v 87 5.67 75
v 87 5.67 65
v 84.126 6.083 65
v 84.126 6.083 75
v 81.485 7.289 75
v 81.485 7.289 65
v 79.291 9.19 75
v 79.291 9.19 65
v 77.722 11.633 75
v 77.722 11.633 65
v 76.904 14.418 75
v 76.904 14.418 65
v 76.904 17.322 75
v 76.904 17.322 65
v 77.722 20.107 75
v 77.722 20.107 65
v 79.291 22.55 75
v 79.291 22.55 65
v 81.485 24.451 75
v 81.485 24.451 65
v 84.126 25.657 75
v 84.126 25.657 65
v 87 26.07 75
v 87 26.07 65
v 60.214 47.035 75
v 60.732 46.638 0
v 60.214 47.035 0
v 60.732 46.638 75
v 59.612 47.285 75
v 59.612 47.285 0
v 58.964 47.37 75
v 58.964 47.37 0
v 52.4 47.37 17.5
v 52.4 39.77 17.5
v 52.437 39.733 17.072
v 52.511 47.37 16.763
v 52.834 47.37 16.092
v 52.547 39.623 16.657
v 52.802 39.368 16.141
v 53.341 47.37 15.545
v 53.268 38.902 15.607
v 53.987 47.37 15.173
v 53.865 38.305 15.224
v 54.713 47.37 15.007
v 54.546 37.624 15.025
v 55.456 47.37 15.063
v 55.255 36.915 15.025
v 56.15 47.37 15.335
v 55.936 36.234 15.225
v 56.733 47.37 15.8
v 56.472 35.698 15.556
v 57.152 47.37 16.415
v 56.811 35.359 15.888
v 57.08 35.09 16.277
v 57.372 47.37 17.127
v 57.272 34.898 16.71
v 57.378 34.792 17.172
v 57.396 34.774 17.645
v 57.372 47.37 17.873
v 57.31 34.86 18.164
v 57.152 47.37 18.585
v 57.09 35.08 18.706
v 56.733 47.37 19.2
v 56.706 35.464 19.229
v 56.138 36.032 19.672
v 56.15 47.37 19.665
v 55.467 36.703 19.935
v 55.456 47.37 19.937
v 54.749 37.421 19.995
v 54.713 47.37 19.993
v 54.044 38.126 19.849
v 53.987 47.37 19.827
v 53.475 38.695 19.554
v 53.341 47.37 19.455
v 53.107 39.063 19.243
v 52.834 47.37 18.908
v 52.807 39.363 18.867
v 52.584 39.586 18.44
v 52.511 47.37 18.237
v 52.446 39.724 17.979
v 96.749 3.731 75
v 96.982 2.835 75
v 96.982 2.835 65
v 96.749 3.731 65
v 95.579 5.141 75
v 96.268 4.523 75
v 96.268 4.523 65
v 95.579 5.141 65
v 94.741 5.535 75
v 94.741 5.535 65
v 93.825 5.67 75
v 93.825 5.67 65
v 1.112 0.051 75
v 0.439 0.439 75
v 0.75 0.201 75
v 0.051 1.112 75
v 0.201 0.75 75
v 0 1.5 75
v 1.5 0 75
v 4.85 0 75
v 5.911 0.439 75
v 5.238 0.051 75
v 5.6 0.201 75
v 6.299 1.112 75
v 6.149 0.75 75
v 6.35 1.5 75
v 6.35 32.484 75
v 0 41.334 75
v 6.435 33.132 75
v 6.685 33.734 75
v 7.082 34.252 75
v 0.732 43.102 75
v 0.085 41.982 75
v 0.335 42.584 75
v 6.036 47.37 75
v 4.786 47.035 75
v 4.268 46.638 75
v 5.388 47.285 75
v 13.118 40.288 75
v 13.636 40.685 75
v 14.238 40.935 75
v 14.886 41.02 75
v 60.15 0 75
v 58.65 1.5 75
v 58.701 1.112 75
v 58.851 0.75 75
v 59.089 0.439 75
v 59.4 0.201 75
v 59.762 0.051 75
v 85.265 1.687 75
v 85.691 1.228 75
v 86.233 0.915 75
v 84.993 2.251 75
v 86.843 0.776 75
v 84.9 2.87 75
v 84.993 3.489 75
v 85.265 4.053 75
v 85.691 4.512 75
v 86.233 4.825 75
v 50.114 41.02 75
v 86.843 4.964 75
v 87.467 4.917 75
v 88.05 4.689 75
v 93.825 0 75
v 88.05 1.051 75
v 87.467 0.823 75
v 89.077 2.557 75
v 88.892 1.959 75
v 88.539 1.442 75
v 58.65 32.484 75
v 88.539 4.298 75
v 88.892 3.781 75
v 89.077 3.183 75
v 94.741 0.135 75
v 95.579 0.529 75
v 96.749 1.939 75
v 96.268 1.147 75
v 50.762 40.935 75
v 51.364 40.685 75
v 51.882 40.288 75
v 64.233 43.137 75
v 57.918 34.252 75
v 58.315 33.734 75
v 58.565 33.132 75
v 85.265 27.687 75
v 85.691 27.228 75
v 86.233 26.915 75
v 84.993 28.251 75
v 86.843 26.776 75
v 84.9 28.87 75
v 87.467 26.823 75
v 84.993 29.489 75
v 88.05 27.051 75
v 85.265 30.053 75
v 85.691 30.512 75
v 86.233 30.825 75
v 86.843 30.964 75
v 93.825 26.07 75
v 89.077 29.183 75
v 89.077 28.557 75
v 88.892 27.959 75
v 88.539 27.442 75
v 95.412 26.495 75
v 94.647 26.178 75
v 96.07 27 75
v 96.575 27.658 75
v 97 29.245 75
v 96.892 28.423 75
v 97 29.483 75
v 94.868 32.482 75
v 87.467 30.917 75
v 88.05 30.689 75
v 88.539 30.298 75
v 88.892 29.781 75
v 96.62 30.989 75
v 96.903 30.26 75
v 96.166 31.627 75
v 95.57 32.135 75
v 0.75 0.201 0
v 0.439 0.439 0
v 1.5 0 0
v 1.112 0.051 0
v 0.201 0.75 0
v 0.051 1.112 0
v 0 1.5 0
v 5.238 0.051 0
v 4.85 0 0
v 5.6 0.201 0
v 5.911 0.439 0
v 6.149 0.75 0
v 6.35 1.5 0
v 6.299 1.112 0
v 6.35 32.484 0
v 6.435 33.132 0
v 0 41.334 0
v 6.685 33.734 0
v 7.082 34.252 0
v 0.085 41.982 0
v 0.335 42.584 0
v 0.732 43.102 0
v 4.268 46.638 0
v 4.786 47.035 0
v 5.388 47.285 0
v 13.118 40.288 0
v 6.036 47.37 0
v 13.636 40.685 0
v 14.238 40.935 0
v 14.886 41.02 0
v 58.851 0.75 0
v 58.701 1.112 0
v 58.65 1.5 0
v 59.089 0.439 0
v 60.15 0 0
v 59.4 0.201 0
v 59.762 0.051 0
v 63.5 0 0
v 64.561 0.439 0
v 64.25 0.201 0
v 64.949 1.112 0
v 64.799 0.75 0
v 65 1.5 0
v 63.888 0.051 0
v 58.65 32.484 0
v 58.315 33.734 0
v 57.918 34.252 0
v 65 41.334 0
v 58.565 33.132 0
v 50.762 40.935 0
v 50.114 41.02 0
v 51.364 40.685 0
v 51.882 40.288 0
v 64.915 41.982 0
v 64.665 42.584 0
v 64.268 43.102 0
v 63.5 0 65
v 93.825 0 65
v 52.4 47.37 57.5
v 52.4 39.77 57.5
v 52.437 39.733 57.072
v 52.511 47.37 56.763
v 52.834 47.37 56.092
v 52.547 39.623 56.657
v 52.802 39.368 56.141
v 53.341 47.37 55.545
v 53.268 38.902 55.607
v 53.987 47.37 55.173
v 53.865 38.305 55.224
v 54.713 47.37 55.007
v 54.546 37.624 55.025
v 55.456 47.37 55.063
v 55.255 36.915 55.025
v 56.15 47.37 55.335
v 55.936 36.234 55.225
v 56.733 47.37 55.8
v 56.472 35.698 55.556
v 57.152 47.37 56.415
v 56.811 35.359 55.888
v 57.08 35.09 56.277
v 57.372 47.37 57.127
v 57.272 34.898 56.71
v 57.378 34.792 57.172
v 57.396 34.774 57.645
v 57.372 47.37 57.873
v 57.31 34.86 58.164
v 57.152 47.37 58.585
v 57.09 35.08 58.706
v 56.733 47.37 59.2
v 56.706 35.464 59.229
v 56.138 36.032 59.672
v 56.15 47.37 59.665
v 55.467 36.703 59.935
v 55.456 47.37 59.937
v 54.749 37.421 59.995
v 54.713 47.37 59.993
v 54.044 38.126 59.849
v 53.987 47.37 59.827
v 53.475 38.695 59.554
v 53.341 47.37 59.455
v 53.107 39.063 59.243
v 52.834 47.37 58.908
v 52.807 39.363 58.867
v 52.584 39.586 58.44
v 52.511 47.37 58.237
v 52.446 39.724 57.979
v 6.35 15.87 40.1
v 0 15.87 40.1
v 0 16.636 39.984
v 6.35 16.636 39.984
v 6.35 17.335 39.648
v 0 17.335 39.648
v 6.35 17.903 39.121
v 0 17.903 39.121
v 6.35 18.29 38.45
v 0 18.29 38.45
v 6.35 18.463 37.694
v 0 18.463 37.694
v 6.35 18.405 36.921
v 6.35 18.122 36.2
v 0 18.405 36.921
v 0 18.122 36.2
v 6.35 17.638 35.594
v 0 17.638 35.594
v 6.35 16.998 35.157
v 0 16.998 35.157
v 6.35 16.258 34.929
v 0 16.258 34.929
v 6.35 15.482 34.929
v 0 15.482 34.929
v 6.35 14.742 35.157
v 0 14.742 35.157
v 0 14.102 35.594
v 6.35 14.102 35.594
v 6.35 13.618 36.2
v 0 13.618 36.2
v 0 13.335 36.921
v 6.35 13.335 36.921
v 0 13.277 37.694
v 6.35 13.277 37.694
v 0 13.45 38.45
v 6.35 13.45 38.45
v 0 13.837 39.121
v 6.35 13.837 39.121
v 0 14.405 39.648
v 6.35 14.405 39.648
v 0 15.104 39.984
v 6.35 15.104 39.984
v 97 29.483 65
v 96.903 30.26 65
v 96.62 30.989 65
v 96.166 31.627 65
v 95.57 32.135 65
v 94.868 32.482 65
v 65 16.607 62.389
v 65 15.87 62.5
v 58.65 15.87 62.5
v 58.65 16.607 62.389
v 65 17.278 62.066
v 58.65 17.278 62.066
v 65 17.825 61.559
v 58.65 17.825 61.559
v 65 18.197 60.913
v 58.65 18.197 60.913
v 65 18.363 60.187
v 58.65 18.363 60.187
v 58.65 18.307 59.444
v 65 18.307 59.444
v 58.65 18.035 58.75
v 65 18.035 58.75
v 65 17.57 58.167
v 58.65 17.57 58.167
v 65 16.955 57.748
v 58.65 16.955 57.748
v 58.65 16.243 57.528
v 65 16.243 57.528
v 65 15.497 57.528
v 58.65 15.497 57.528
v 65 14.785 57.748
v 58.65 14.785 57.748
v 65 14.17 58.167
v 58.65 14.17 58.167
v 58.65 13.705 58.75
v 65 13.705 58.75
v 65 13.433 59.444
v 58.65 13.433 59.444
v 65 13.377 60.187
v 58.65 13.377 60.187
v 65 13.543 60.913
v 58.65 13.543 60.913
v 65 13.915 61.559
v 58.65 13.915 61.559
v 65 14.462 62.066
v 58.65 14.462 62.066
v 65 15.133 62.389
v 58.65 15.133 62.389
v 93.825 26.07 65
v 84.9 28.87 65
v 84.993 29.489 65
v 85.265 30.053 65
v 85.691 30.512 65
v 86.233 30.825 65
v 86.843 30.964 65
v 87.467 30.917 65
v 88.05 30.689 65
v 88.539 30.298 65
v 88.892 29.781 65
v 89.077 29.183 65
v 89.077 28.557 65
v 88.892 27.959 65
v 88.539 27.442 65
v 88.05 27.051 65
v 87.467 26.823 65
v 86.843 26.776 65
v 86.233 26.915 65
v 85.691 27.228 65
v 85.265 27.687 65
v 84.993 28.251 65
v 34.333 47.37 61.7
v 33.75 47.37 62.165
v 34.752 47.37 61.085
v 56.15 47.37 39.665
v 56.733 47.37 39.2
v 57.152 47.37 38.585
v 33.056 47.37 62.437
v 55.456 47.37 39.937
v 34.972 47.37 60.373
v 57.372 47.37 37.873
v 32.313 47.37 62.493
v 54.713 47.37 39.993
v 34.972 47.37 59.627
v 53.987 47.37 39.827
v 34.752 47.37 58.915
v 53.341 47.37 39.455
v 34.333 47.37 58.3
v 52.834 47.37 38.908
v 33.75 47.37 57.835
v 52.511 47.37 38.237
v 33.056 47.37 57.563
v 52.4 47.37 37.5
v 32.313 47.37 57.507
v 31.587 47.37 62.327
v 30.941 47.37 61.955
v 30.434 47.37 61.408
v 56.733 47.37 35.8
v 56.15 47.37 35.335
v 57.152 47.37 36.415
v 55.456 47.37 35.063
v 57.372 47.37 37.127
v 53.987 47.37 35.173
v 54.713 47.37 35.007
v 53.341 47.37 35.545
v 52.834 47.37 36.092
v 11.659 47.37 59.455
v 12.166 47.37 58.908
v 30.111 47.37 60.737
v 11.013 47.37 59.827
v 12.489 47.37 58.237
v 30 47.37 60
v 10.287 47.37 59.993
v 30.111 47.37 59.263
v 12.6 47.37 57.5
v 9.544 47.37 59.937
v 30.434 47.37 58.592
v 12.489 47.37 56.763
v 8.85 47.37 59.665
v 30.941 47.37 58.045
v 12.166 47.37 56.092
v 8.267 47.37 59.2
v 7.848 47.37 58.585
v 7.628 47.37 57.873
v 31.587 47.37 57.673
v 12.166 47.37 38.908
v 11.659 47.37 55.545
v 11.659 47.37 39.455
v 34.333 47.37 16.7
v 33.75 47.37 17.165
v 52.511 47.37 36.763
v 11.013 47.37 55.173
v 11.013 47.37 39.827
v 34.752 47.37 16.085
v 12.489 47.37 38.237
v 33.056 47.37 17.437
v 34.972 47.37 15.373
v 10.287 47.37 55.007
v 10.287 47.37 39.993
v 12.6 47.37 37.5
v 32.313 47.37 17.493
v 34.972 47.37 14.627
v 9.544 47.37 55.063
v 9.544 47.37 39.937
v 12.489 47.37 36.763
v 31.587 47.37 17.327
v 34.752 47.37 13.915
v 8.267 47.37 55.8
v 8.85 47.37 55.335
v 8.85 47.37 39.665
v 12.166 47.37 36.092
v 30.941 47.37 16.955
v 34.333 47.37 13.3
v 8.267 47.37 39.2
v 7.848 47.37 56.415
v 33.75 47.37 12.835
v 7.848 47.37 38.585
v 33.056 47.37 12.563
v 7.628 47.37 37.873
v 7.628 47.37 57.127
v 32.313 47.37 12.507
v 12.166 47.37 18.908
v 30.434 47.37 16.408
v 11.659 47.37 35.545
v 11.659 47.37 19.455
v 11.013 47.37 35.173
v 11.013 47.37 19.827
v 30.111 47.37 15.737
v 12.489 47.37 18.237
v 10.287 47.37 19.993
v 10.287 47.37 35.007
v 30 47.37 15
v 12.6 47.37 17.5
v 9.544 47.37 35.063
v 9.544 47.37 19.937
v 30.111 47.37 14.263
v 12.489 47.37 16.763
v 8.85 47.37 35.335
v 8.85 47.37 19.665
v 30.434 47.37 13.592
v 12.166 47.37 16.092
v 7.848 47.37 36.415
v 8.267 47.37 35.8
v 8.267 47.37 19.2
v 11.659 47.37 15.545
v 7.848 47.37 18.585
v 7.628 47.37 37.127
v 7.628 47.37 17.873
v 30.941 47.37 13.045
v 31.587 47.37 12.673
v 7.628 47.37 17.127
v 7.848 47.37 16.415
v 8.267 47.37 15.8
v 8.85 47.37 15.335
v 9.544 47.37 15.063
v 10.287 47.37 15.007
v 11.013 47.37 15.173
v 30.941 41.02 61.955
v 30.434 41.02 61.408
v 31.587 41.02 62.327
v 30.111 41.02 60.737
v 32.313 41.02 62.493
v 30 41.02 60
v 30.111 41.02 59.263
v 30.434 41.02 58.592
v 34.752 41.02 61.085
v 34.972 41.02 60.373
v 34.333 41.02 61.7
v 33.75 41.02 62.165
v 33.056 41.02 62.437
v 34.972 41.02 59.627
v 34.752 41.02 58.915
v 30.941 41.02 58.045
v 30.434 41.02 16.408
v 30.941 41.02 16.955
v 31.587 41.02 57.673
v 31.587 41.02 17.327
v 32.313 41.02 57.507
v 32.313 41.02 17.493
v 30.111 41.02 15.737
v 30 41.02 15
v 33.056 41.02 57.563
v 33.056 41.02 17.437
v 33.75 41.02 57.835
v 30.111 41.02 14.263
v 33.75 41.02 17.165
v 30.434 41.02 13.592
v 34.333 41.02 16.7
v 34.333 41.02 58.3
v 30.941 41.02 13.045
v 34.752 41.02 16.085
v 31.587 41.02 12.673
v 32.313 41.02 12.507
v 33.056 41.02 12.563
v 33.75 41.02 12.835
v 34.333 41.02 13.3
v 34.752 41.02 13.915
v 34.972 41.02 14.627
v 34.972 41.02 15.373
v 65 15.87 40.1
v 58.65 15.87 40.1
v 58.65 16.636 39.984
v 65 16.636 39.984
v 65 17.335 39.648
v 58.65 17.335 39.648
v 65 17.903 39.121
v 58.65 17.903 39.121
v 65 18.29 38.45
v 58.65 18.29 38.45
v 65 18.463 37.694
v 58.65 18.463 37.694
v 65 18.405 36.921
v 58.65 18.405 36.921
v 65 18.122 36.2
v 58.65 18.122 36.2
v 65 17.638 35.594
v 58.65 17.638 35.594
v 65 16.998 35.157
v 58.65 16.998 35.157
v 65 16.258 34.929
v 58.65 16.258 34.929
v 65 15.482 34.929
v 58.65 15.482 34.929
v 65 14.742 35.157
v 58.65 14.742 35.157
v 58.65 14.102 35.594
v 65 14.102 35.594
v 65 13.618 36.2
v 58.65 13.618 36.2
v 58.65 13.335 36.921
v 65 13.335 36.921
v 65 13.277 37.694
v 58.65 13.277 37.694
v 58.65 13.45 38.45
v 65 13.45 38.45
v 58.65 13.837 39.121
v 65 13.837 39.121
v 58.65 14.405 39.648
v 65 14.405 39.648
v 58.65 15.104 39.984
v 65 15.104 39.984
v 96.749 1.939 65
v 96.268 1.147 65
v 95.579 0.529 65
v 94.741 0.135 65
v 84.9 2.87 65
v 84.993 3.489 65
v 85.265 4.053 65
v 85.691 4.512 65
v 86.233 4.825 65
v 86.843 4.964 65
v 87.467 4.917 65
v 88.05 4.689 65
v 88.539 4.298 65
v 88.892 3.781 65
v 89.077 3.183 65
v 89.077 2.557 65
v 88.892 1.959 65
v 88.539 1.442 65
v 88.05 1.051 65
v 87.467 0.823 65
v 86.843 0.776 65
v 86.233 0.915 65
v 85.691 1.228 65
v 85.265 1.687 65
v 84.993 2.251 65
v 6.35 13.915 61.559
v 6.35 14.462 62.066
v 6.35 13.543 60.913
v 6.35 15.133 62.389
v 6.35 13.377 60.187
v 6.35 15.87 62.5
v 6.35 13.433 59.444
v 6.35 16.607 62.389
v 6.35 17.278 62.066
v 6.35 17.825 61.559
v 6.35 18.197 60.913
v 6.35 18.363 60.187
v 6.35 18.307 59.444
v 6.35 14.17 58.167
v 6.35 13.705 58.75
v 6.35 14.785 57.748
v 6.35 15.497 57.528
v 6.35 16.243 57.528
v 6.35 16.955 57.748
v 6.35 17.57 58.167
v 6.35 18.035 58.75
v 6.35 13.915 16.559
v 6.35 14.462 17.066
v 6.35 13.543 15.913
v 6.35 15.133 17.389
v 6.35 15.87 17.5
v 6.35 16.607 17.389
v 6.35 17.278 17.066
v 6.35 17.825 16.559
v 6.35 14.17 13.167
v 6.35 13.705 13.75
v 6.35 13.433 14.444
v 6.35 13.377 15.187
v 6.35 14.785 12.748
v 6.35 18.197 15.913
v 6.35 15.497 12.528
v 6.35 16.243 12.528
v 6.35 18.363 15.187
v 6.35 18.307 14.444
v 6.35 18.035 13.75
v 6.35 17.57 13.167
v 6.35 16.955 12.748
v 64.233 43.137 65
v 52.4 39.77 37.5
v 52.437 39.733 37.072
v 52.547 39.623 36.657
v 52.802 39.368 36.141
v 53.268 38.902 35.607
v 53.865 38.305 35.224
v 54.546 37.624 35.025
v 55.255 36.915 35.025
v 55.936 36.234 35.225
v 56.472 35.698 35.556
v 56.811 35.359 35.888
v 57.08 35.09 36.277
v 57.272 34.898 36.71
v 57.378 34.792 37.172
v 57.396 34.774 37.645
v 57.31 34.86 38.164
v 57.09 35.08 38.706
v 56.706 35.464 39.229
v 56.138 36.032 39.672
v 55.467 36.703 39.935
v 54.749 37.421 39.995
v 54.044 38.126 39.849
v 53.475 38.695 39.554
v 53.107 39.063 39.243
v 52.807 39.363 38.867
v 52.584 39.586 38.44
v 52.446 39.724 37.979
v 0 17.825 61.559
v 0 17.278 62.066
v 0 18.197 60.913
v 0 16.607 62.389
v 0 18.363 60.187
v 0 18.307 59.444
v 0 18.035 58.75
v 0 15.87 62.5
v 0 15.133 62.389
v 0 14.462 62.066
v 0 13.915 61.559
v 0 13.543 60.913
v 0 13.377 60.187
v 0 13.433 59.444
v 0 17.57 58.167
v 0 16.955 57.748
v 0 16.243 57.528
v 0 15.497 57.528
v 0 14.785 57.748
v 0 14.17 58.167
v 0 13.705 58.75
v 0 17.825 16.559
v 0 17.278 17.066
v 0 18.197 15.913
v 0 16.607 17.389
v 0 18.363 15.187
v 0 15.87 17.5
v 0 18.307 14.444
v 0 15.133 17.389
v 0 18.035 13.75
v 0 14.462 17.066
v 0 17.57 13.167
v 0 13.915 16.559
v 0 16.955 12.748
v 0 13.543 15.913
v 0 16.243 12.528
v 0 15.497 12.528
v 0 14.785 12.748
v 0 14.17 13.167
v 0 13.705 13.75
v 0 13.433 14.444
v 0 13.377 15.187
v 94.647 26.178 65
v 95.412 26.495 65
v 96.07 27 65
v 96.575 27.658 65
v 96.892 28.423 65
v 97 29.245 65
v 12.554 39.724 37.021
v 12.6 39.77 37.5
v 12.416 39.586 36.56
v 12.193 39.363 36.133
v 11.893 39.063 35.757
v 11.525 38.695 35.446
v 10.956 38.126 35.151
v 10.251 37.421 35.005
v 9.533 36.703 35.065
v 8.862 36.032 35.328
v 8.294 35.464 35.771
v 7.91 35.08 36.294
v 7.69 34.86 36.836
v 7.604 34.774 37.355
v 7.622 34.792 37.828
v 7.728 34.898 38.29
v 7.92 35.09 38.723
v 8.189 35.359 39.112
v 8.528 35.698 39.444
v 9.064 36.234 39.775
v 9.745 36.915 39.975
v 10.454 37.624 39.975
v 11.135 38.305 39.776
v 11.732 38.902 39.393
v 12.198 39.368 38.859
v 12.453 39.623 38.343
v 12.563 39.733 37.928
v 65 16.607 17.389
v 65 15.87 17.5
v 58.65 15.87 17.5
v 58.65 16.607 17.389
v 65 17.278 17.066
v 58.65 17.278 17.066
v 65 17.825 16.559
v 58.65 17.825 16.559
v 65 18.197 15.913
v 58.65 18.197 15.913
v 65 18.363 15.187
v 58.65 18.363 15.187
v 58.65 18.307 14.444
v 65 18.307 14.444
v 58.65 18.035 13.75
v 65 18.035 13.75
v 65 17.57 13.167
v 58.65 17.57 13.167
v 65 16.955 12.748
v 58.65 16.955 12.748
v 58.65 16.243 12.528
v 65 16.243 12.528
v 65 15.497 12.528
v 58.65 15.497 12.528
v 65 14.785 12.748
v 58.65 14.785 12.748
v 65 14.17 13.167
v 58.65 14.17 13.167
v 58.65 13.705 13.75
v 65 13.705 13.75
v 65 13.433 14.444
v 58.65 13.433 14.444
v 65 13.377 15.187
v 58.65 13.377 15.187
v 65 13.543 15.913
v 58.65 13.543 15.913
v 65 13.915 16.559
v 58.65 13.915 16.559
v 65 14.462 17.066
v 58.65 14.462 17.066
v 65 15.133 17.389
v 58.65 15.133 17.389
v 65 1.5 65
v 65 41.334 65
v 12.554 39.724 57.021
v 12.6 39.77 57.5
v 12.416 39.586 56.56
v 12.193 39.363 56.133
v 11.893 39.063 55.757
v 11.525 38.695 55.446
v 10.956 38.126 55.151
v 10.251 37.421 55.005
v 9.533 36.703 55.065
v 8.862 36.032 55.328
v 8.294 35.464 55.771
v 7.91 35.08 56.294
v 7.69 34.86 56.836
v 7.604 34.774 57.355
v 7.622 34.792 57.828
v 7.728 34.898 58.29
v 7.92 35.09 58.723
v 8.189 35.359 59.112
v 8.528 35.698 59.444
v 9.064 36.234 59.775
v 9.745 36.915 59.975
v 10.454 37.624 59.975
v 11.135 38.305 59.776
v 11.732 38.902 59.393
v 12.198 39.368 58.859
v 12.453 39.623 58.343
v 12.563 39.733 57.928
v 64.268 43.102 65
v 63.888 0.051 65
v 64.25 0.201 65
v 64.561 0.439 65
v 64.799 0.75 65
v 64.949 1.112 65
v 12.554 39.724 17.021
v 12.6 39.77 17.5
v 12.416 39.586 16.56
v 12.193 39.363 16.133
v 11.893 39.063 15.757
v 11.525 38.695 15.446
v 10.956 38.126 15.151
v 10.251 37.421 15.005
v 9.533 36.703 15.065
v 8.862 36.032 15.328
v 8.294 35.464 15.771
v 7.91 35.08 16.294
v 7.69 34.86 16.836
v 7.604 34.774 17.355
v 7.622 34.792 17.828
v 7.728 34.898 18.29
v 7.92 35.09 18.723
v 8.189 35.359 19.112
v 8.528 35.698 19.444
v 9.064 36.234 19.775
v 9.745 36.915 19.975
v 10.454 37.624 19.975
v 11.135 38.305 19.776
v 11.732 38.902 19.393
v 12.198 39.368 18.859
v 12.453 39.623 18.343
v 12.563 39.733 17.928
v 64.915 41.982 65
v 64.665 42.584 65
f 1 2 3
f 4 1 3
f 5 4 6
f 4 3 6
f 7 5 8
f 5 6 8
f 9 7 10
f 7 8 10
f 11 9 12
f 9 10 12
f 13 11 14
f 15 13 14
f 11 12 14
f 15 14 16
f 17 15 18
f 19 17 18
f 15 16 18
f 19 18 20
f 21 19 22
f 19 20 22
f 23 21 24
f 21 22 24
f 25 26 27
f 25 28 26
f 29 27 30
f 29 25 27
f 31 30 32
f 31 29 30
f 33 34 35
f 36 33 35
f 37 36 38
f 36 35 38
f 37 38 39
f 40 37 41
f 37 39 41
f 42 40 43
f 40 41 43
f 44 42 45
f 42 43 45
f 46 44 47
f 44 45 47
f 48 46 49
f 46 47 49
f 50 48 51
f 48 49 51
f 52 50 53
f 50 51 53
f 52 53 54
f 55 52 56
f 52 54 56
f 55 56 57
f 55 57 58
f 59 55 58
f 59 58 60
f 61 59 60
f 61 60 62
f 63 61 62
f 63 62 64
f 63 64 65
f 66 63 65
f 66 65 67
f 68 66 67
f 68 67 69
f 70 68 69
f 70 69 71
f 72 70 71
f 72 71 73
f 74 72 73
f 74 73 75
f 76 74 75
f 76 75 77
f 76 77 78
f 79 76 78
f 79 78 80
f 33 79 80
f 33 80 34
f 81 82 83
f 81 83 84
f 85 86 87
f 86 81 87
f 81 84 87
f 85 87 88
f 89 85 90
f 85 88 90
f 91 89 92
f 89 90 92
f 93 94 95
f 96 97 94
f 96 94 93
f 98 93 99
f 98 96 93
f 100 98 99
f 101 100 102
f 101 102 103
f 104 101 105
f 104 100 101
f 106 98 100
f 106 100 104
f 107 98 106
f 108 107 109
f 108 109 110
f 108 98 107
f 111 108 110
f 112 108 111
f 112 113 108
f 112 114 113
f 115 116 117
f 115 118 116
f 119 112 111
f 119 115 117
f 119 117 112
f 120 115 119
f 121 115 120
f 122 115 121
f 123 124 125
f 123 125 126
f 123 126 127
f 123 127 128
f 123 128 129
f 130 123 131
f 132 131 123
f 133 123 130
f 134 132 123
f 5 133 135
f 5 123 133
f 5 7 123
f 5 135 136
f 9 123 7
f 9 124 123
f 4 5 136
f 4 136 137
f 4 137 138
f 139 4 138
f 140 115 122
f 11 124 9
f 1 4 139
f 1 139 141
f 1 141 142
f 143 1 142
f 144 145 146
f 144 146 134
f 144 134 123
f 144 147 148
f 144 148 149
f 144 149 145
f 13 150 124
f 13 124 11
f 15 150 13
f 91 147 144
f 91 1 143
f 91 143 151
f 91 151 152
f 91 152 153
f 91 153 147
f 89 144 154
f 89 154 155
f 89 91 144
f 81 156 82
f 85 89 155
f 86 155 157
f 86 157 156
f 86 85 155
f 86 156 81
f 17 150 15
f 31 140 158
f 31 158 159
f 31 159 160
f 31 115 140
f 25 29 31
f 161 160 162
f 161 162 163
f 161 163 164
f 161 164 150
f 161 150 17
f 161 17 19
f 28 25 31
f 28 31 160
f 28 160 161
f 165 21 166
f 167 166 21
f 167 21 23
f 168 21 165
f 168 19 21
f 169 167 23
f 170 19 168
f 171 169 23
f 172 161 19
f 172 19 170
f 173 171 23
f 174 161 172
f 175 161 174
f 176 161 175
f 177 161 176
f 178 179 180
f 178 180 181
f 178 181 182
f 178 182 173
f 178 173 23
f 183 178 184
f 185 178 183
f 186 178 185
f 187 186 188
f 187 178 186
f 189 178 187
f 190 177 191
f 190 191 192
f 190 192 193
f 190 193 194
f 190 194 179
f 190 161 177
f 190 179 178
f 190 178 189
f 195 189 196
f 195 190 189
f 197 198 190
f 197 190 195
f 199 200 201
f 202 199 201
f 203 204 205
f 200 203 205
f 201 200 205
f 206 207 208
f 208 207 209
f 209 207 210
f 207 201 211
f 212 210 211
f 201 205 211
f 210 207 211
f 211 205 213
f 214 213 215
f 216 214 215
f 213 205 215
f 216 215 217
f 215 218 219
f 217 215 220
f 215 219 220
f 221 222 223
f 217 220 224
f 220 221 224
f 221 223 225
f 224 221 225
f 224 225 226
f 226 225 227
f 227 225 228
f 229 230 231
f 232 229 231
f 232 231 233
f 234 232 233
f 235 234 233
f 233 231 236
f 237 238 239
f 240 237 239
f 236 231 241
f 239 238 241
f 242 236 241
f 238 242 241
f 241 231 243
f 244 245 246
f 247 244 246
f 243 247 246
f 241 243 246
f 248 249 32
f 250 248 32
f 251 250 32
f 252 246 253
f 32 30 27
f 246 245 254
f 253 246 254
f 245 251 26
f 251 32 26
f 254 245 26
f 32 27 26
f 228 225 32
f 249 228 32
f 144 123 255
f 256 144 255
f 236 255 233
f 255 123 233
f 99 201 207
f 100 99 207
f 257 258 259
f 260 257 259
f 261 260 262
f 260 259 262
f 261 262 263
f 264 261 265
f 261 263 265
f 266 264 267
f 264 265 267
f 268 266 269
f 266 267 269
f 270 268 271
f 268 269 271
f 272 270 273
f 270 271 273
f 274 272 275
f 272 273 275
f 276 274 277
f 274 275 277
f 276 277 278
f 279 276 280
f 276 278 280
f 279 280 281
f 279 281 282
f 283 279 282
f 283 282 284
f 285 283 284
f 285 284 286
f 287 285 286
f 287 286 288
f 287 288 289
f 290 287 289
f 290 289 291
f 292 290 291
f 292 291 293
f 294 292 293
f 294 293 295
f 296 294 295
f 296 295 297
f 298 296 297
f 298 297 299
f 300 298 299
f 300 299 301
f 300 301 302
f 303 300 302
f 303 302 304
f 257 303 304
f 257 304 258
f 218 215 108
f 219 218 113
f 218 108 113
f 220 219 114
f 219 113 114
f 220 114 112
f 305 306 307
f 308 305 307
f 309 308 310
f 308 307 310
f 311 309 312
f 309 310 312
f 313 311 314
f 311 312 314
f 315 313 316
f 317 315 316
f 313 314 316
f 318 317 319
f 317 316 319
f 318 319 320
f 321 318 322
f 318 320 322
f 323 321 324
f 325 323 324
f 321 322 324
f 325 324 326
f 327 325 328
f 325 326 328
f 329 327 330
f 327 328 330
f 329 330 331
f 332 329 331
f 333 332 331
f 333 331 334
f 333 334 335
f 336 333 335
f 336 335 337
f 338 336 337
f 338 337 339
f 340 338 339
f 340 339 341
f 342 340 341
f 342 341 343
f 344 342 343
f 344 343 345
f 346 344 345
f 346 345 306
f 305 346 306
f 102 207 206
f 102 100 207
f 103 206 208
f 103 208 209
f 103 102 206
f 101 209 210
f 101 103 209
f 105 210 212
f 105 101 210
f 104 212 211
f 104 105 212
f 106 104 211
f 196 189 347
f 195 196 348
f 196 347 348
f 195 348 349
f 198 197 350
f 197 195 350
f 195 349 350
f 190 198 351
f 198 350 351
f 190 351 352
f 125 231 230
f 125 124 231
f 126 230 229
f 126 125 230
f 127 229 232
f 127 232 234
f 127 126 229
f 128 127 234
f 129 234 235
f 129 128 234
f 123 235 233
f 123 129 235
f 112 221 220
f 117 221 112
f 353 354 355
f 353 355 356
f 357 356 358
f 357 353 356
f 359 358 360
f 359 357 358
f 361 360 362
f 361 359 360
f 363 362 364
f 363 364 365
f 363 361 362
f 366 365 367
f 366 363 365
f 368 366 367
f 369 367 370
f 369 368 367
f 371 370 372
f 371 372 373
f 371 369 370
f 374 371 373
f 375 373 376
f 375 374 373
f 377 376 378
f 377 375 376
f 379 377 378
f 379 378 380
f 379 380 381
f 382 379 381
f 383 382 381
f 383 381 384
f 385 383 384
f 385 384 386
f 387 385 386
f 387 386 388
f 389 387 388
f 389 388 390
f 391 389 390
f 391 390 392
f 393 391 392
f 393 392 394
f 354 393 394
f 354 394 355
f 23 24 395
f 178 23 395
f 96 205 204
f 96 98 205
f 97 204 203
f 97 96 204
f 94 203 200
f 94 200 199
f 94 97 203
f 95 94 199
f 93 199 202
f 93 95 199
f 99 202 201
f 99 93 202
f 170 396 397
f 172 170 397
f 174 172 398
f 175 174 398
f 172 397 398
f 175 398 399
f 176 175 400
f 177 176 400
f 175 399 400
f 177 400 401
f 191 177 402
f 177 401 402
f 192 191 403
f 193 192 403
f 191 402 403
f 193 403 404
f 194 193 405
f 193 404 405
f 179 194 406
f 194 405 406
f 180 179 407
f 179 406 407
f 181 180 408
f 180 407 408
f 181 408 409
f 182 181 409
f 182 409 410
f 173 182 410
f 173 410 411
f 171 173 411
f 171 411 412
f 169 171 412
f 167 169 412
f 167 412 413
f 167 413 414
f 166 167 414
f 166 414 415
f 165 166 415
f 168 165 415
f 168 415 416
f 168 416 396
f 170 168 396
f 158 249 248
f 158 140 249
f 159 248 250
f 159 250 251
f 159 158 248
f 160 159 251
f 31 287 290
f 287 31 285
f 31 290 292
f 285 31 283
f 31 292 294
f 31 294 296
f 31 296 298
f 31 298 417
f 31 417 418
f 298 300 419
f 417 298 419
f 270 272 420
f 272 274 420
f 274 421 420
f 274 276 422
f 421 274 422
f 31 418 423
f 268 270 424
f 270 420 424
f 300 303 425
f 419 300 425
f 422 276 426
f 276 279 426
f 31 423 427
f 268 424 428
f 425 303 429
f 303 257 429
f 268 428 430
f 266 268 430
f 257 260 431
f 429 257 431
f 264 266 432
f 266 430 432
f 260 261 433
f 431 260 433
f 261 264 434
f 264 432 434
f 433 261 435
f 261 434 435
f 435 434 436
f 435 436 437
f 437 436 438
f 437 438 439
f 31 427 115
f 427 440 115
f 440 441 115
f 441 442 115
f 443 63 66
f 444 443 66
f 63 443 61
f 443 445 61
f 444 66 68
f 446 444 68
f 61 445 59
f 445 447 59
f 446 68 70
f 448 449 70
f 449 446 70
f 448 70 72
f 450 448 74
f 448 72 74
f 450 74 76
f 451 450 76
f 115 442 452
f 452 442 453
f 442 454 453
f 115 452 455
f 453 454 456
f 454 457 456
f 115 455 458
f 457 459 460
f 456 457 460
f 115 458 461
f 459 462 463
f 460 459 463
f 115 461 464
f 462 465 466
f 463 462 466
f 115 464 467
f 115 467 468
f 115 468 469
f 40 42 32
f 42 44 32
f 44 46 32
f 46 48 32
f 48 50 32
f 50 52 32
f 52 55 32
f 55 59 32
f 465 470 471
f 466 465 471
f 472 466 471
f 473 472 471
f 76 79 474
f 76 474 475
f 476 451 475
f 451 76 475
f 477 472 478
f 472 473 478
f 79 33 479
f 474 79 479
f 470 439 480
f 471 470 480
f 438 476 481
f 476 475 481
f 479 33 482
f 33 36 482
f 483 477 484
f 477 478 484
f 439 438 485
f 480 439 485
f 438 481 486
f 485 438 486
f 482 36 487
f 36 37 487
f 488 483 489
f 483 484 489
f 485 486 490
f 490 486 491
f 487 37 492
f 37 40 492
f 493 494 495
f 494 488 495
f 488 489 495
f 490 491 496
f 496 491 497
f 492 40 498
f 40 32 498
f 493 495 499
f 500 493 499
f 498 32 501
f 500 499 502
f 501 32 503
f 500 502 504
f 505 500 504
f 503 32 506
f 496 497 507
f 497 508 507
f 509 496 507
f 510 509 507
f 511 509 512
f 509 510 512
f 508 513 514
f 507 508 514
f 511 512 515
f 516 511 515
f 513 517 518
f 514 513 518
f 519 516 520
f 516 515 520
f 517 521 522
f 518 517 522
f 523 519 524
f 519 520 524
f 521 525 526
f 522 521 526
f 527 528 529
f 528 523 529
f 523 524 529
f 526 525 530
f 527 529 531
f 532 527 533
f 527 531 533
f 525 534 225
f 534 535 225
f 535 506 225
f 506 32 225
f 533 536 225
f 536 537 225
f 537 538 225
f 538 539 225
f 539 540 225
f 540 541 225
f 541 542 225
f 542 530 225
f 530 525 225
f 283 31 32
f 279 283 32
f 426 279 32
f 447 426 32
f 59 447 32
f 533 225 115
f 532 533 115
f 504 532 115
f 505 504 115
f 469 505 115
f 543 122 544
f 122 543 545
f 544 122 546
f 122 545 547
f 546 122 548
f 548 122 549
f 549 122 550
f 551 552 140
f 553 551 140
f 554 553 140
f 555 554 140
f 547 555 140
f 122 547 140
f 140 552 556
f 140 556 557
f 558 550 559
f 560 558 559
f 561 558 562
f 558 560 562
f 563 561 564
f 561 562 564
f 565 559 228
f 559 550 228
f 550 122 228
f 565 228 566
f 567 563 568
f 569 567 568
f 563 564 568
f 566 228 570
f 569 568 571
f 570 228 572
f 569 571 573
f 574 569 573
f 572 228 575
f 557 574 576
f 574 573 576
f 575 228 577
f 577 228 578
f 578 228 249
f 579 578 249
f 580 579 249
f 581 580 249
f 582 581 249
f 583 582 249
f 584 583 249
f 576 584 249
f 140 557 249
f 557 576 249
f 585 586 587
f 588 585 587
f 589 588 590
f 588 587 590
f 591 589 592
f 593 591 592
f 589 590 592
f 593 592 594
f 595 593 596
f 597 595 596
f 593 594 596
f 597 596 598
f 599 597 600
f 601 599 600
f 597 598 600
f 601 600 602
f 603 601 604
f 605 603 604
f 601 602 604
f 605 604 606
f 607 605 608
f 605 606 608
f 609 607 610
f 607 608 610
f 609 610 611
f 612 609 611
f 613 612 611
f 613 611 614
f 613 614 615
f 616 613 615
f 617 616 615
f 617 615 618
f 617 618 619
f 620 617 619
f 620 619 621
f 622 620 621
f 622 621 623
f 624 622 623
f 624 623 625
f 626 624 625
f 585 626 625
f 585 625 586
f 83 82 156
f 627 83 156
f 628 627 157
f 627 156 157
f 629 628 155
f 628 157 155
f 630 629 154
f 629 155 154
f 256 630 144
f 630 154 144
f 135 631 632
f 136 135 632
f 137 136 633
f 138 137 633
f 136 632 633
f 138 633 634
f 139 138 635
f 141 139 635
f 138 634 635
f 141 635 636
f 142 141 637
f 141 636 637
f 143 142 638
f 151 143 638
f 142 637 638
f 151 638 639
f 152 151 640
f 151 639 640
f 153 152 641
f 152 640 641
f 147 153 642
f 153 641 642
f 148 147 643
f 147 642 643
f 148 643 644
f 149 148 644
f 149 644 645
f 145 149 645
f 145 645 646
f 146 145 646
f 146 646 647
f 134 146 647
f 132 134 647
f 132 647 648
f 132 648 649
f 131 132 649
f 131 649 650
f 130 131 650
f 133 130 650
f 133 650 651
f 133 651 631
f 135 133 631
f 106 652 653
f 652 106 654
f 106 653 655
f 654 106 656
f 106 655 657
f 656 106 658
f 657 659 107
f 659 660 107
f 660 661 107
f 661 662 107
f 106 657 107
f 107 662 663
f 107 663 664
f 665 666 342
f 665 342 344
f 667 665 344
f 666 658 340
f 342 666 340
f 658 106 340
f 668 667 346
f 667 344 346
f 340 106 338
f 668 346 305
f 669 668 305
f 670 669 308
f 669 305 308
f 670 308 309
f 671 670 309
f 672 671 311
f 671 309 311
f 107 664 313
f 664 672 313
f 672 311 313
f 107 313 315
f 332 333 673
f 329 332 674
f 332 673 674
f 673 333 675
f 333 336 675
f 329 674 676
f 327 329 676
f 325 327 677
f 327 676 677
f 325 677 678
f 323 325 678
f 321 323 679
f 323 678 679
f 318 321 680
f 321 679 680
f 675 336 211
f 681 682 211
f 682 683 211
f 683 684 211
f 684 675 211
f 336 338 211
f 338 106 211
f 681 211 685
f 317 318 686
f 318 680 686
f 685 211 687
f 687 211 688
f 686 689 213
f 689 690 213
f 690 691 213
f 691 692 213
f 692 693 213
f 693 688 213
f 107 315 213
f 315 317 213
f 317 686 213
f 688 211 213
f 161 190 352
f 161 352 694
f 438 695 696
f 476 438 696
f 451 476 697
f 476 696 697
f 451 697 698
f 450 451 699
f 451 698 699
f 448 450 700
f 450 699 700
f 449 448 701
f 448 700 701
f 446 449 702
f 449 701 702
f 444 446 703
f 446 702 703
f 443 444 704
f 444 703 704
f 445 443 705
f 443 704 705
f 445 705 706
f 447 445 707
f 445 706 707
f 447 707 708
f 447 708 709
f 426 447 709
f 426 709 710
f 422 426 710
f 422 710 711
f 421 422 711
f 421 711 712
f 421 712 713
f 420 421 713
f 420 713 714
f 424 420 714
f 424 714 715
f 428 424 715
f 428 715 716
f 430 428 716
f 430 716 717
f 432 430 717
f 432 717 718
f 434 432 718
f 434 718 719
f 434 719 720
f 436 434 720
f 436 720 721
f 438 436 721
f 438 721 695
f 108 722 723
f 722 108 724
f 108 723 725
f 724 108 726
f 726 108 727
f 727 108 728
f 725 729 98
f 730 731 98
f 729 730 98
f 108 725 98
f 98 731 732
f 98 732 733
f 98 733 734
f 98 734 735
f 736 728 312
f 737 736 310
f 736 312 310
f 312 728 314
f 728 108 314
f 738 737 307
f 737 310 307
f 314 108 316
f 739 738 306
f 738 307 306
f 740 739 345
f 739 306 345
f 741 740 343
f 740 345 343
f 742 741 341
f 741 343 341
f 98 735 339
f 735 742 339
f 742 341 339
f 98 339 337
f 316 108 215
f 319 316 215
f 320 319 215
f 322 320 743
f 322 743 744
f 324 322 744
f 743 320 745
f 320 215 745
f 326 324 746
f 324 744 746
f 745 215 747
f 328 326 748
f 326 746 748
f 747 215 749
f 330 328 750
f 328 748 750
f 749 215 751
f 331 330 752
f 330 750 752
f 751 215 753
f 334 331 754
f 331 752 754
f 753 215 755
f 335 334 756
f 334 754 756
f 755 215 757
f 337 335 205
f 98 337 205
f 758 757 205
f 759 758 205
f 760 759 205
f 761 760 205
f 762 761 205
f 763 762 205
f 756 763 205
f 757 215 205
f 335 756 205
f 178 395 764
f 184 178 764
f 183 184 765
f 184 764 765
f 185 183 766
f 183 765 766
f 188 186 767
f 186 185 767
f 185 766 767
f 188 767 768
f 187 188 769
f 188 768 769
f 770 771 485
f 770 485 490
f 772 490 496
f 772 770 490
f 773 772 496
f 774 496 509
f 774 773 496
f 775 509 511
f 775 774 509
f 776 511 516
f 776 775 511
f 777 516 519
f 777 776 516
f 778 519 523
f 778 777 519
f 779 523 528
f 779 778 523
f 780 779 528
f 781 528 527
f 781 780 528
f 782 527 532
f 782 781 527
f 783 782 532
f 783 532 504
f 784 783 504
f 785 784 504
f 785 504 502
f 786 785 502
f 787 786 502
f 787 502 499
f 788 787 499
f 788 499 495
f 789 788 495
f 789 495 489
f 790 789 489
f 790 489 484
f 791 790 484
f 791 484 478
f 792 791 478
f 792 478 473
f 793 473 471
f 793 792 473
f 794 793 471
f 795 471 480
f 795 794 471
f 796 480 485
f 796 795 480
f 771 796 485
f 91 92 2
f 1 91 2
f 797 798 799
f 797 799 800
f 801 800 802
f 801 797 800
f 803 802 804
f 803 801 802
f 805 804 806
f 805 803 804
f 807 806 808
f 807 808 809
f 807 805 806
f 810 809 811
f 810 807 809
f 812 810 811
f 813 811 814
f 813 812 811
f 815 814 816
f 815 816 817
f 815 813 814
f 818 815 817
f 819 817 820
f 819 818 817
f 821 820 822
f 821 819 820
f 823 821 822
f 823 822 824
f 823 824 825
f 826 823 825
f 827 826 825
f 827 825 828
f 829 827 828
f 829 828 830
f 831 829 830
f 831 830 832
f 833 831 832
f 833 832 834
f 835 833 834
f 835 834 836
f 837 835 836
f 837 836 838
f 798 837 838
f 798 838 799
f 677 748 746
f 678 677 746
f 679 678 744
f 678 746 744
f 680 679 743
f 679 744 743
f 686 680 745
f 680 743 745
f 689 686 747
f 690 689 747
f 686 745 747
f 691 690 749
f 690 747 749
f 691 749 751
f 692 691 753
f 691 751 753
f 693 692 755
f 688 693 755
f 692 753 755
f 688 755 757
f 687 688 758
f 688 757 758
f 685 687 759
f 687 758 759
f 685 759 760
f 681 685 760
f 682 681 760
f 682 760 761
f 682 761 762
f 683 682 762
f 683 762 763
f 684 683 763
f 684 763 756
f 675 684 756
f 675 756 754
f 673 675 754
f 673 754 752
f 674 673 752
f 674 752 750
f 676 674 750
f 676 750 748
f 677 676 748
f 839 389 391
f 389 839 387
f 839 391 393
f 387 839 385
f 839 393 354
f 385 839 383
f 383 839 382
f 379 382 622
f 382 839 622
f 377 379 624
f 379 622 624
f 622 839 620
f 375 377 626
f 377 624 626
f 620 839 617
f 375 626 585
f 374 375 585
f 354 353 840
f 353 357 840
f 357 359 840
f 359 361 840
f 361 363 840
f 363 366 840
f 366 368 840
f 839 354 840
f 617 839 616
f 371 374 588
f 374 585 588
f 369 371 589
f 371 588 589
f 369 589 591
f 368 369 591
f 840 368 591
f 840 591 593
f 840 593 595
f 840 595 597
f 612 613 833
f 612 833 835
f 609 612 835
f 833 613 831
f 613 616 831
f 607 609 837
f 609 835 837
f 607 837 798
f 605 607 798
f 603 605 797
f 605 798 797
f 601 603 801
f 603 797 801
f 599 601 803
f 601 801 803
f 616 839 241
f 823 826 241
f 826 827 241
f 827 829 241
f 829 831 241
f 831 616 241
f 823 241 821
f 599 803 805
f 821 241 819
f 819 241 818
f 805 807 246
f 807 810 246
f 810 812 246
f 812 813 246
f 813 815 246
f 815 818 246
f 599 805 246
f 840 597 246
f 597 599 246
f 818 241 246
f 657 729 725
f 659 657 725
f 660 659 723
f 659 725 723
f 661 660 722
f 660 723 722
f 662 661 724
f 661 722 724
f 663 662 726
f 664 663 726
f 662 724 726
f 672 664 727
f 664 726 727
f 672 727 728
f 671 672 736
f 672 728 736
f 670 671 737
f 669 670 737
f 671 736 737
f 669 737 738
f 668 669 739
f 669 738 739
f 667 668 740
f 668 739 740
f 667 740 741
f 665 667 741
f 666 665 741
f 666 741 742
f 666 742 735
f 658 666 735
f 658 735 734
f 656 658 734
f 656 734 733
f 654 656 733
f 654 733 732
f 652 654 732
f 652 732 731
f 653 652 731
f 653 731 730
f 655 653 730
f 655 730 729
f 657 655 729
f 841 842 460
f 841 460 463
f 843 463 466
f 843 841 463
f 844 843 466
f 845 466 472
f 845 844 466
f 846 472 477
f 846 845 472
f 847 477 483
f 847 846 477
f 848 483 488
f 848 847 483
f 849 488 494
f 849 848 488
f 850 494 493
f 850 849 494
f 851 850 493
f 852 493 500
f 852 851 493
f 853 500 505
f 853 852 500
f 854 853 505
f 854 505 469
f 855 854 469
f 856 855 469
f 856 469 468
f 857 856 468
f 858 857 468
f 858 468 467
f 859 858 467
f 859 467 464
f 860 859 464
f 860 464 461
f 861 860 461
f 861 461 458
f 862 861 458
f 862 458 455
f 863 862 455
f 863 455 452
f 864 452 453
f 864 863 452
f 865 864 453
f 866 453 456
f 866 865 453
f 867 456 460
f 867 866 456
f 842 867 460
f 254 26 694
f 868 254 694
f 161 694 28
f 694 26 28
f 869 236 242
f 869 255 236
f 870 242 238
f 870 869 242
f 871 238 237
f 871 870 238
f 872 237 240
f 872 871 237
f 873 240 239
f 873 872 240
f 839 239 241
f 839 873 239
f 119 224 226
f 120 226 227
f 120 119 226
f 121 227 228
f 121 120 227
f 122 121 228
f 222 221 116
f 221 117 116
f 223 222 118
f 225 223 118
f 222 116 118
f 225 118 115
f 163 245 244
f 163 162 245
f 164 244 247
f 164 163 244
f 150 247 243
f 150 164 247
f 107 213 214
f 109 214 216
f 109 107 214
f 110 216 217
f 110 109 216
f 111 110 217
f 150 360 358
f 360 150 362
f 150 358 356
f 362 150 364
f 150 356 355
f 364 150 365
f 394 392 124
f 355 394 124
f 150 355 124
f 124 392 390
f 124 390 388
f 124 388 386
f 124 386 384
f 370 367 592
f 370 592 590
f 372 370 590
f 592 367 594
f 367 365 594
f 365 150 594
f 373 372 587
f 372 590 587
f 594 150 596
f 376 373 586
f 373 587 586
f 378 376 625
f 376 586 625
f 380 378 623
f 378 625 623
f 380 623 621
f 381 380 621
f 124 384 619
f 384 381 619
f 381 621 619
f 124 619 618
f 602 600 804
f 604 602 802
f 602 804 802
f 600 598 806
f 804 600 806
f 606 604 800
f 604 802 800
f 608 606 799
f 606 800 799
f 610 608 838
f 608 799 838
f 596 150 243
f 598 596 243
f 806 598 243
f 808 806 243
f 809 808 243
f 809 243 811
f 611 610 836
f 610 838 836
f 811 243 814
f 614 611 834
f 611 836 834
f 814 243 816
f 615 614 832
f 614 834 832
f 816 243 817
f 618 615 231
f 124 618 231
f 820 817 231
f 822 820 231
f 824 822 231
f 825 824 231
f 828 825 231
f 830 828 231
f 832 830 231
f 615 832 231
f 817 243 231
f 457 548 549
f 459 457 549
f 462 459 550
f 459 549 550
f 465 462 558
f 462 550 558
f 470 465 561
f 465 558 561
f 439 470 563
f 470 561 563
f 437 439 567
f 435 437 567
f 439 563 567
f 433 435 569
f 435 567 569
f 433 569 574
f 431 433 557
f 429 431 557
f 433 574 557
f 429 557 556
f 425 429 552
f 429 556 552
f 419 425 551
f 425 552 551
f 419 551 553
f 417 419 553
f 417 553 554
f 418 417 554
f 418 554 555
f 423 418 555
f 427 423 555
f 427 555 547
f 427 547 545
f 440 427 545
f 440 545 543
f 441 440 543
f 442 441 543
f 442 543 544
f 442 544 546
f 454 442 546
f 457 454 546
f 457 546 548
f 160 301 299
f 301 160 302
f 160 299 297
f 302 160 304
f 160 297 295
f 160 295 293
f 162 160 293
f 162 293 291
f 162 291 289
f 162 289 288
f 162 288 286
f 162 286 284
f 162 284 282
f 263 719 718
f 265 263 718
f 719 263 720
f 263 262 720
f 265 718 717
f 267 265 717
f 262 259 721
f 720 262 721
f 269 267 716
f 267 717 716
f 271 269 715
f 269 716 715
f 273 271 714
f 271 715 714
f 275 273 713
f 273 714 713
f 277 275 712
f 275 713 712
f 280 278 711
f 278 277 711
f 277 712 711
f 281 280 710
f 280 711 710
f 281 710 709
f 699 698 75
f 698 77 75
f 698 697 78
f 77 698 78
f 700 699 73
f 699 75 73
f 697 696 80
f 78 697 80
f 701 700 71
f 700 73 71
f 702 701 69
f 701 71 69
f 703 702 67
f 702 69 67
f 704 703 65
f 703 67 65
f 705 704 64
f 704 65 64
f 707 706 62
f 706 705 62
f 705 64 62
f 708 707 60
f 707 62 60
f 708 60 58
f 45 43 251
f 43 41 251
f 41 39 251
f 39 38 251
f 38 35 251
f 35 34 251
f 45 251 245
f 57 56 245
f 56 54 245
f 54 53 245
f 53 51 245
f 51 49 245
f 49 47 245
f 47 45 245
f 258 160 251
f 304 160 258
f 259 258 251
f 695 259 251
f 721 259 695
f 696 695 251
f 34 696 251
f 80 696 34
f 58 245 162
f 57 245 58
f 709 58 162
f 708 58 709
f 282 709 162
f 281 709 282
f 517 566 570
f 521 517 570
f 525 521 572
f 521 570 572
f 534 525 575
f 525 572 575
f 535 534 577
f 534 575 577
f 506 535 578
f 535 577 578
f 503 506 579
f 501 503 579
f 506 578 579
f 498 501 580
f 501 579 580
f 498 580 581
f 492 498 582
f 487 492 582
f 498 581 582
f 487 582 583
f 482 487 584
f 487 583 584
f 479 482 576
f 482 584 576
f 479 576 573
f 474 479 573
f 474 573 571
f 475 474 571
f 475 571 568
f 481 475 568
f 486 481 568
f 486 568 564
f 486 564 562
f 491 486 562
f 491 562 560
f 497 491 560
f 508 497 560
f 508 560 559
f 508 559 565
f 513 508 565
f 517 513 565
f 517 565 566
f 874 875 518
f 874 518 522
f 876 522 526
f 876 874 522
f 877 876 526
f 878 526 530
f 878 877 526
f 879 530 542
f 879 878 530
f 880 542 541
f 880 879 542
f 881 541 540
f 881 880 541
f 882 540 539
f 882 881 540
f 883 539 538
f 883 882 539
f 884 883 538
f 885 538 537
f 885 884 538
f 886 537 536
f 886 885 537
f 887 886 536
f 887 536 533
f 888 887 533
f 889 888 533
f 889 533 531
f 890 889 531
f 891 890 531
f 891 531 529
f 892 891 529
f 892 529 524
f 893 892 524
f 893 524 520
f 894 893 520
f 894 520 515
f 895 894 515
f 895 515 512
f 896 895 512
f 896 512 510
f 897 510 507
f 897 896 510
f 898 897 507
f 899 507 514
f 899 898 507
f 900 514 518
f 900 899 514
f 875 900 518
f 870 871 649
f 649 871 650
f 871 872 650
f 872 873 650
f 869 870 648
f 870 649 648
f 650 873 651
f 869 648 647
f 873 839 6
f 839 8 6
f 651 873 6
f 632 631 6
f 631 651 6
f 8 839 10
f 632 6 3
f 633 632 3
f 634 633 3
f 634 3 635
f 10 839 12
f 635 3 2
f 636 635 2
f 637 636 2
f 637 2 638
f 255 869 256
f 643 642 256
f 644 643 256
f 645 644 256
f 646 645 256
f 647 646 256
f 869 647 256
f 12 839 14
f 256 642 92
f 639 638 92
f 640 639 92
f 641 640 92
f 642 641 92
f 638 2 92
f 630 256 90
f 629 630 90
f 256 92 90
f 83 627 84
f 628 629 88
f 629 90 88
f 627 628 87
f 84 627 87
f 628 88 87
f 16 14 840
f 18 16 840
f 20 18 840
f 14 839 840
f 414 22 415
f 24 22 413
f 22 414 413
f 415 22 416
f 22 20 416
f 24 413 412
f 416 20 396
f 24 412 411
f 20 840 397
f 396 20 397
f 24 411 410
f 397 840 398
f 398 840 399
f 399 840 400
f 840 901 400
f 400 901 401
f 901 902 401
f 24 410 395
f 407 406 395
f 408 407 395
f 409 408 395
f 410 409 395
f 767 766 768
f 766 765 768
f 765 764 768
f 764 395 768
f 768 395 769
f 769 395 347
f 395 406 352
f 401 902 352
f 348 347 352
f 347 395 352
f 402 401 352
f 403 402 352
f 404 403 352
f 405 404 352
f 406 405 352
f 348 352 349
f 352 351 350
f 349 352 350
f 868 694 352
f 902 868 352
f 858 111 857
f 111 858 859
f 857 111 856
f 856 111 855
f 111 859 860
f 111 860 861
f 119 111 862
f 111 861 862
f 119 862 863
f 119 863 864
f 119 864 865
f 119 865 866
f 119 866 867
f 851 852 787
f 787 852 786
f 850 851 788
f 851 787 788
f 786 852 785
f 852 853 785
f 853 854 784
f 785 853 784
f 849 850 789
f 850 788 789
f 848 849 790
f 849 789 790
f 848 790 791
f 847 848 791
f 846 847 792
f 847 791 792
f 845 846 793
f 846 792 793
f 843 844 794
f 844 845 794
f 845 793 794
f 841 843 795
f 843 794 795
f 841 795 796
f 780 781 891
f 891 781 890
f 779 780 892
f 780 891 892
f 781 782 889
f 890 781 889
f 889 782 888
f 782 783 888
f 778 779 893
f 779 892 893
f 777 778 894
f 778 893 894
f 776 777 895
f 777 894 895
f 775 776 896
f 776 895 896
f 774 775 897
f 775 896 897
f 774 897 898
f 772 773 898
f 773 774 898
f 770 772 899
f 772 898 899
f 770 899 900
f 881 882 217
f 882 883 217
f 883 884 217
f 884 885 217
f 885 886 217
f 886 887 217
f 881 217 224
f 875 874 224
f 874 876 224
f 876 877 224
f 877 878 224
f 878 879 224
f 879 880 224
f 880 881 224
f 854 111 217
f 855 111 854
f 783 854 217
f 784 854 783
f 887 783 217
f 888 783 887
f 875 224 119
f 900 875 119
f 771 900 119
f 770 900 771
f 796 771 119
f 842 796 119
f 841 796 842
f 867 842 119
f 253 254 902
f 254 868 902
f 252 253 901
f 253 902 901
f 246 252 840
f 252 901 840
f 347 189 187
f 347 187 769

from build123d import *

# Parameters (mm, degrees)
BOSS_EXTRUDE1_DEPTH        = 75
M6X1_0_TAPPED_HOLE1_REACH  = 111.972
M6X1_0_TAPPED_HOLE1_BORE_R = 2.5
M6X1_0_TAPPED_HOLE2_D      = 5
SKETCH8_R                  = 2.6
CUT_EXTRUDE1_DEPTH         = 110.972346069
SKETCH9_W                  = 10
SKETCH9_H                  = 31.74
BOSS_EXTRUDE2_DEPTH        = 32
CUT_EXTRUDE2_REACH         = 128.008
SKETCH10_R                 = 2.1
BOSS_EXTRUDE3_DEPTH        = 10
M6X1_0_TAPPED_HOLE3_D      = 5
M6X1_0_TAPPED_HOLE3_DEPTH  = 13.851
FILLET1_R                  = 3.175
CHAMFER1_SIZE              = 5
FILLET2_R                  = 2.5
FILLET3_R                  = 1.5


with BuildPart() as part:
    # Sketch1 → Boss-Extrude1 (new body)
    with BuildSketch(Plane.XY):
        Polygon((6.35, 33.52), (13.85, 41.02), (51.15, 41.02), (58.65, 33.52), (58.65, 0), (65, 0), (65, 41.02), (65, 47.37), (0, 47.37), (0, 41.02), (0, 0), (6.35, 0), align=None)
    extrude(amount=BOSS_EXTRUDE1_DEPTH)

    # M6x1.0 Tapped Hole1 bore → M6x1.0 Tapped Hole1 (cut, up to next)
    with BuildSketch(Plane.ZY, mode=Mode.PRIVATE) as m6x1_0_tapped_hole1_sk1:
        with Locations((60, 15.87)):
            Circle(M6X1_0_TAPPED_HOLE1_BORE_R)
    m6x1_0_tapped_hole1_tool1 = extrude(m6x1_0_tapped_hole1_sk1.sketch, amount=-M6X1_0_TAPPED_HOLE1_REACH, mode=Mode.PRIVATE) & part.part
    # M6x1.0 Tapped Hole1 bore → M6x1.0 Tapped Hole1 (cut, up to next)
    with BuildSketch(Plane.ZY, mode=Mode.PRIVATE) as m6x1_0_tapped_hole1_sk2:
        with Locations((15, 15.87)):
            Circle(M6X1_0_TAPPED_HOLE1_BORE_R)
    m6x1_0_tapped_hole1_tool2 = extrude(m6x1_0_tapped_hole1_sk2.sketch, amount=-M6X1_0_TAPPED_HOLE1_REACH, mode=Mode.PRIVATE) & part.part
    m6x1_0_tapped_hole1_1 = m6x1_0_tapped_hole1_tool1.solids().sort_by_distance((0, 15.87, 60))[0]
    add(m6x1_0_tapped_hole1_1, mode=Mode.SUBTRACT)
    m6x1_0_tapped_hole1_2 = m6x1_0_tapped_hole1_tool2.solids().sort_by_distance((0, 15.87, 15))[0]
    add(m6x1_0_tapped_hole1_2, mode=Mode.SUBTRACT)
    m6x1_0_tapped_hole1 = m6x1_0_tapped_hole1_1 + m6x1_0_tapped_hole1_2  # M6x1.0 Tapped Hole1 as one shape, for the pattern or mirror that repeats it

    # Mirror1: M6x1.0 Tapped Hole1 across plane
    add(m6x1_0_tapped_hole1.mirror(Plane.ZY.offset(-32.5)), mode=Mode.SUBTRACT)

    # M6x1.0 Tapped Hole2 (through all)
    with Locations(Plane(origin=(0, 47.37, 0), x_dir=(1, 0, 0), z_dir=(0, 1, 0))):
        with Locations((32.5, -15), (32.5, -60)):
            Hole(M6X1_0_TAPPED_HOLE2_D / 2)

    # Sketch8 → Cut-Extrude1 (cut, through all)
    with BuildSketch(Plane.ZY):
        with Locations((37.5, 15.87)):
            Circle(SKETCH8_R)
    extrude(amount=-CUT_EXTRUDE1_DEPTH, mode=Mode.SUBTRACT)

    # Sketch9 → Boss-Extrude2 (add)
    with BuildSketch(Plane(origin=(65, 0, 0), x_dir=(0, 0, -1), z_dir=(1, 0, 0))):
        with Locations((-70, 15.87)):
            Rectangle(SKETCH9_W, SKETCH9_H)
    extrude(amount=BOSS_EXTRUDE2_DEPTH)

    # Sketch10 → Cut-Extrude2 (cut, up to next)
    with BuildSketch(Plane(origin=(0, 0, 65), x_dir=(-1, 0, 0), z_dir=(0, 0, -1)), mode=Mode.PRIVATE) as cut_extrude2_sk1:
        with Locations((-87, 28.87)):
            Circle(SKETCH10_R)
    cut_extrude2_tool1 = extrude(cut_extrude2_sk1.sketch, amount=-CUT_EXTRUDE2_REACH, mode=Mode.PRIVATE) & part.part
    # Sketch10 → Cut-Extrude2 (cut, up to next)
    with BuildSketch(Plane(origin=(0, 0, 65), x_dir=(-1, 0, 0), z_dir=(0, 0, -1)), mode=Mode.PRIVATE) as cut_extrude2_sk2:
        with Locations((-87, 2.87)):
            Circle(SKETCH10_R)
    cut_extrude2_tool2 = extrude(cut_extrude2_sk2.sketch, amount=-CUT_EXTRUDE2_REACH, mode=Mode.PRIVATE) & part.part
    # Sketch10 → Cut-Extrude2 (cut, up to next)
    with BuildSketch(Plane(origin=(0, 0, 65), x_dir=(-1, 0, 0), z_dir=(0, 0, -1)), mode=Mode.PRIVATE) as cut_extrude2_sk3:
        with BuildLine():
            Line((-87, 26.07), (-97, 26.07))
            Line((-97, 26.07), (-97, 5.67))
            Line((-97, 5.67), (-87, 5.67))
            ThreePointArc((-87, 5.67), (-76.8, 15.87), (-87, 26.07))
        make_face()
    cut_extrude2_tool3 = extrude(cut_extrude2_sk3.sketch, amount=-CUT_EXTRUDE2_REACH, mode=Mode.PRIVATE) & part.part
    add(cut_extrude2_tool1.solids().sort_by_distance((87, 28.87, 65))[0], mode=Mode.SUBTRACT)
    add(cut_extrude2_tool2.solids().sort_by_distance((87, 2.87, 65))[0], mode=Mode.SUBTRACT)
    add(cut_extrude2_tool3.solids().sort_by_distance((87.850588, 15.87, 65))[0], mode=Mode.SUBTRACT)

    # Sketch11 → Boss-Extrude3 (add)
    with BuildSketch(Plane.XY.offset(75)):
        Polygon((97, 31.74), (65, 42.87), (65, 31.74), align=None)
    extrude(amount=-BOSS_EXTRUDE3_DEPTH)

    # M6x1.0 Tapped Hole3
    with Locations(Plane(origin=(0, 47.37, 0), x_dir=(1, 0, 0), z_dir=(0, 1, 0))):
        with Locations((54.9, -57.5), (54.9, -37.5), (54.9, -17.5)):
            m6x1_0_tapped_hole3 = Hole(M6X1_0_TAPPED_HOLE3_D / 2, depth=M6X1_0_TAPPED_HOLE3_DEPTH)

    # Mirror2: M6x1.0 Tapped Hole3 across plane
    add(m6x1_0_tapped_hole3.mirror(Plane.ZY.offset(-32.5)), mode=Mode.SUBTRACT)

    # Fillet1
    # the kernel refuses this fillet: 3.175 mm, written as the material it takes off along each edge
    with BuildSketch(Plane(origin=(97, 5.67, 57.0625), x_dir=(0, -1, 0), z_dir=(0, 0, 1)), Plane(origin=(97, 26.07, 57.0625), x_dir=(-1, 0, 0), z_dir=(0, 0, 1))) as fillet1_piece_1:
        with BuildLine():
            CenterArc((FILLET1_R, -FILLET1_R), FILLET1_R, 90, 90)
            Line((0, -FILLET1_R), (0, 0))
            Line((0, 0), (FILLET1_R, 0))
        make_face()
    extrude(amount=25.875, mode=Mode.SUBTRACT)
    with BuildSketch(Plane(origin=(97, 31.74, 59.356851229), x_dir=(0, -1, 0), z_dir=(0, 0, 1))) as fillet1_piece_2:
        with BuildLine():
            CenterArc((FILLET1_R * 0.710947876646, -FILLET1_R), FILLET1_R, 90, 70.821686435)
            Line((-FILLET1_R * 0.233552901866, -FILLET1_R * 0.671490822974), (0, 0))
            Line((0, 0), (FILLET1_R * 0.710947876646, 0))
        make_face()
    extrude(amount=21.286297542, mode=Mode.SUBTRACT)
    with BuildSketch(Plane(origin=(97, 0, 82.9375), x_dir=(-1, 0, 0), z_dir=(0, 0, -1))) as fillet1_piece_3:
        with BuildLine():
            CenterArc((FILLET1_R, FILLET1_R), FILLET1_R, 180, 90)
            Line((0, FILLET1_R), (0, 0))
            Line((0, 0), (FILLET1_R, 0))
        make_face()
    extrude(amount=25.875, mode=Mode.SUBTRACT)

    # Chamfer1
    chamfer1_edges = [part.edges().sort_by_distance(p)[0] for p in [
        (0, 47.37, 37.5),
        (65, 47.37, 37.5),
    ]]
    chamfer(chamfer1_edges, length=CHAMFER1_SIZE)

    # Fillet2
    fillet2_edges = [part.edges().sort_by_distance(p)[0] for p in [
        (0, 42.37, 37.5),
        (60, 47.37, 37.5),
        (5, 47.37, 37.5),
        (65, 42.37, 32.5),
        (58.65, 33.52, 37.5),
        (51.15, 41.02, 37.5),
        (13.85, 41.02, 37.5),
        (6.35, 33.52, 37.5),
    ]]
    fillet(fillet2_edges, radius=FILLET2_R)

    # Fillet3
    fillet3_edges = [part.edges().sort_by_distance(p)[0] for p in [
        (0, 0, 37.5),
        (58.65, 0, 37.5),
        (6.35, 0, 37.5),
        (65, 0, 32.5),
    ]]
    fillet(fillet3_edges, radius=FILLET3_R)


solid = part.part
